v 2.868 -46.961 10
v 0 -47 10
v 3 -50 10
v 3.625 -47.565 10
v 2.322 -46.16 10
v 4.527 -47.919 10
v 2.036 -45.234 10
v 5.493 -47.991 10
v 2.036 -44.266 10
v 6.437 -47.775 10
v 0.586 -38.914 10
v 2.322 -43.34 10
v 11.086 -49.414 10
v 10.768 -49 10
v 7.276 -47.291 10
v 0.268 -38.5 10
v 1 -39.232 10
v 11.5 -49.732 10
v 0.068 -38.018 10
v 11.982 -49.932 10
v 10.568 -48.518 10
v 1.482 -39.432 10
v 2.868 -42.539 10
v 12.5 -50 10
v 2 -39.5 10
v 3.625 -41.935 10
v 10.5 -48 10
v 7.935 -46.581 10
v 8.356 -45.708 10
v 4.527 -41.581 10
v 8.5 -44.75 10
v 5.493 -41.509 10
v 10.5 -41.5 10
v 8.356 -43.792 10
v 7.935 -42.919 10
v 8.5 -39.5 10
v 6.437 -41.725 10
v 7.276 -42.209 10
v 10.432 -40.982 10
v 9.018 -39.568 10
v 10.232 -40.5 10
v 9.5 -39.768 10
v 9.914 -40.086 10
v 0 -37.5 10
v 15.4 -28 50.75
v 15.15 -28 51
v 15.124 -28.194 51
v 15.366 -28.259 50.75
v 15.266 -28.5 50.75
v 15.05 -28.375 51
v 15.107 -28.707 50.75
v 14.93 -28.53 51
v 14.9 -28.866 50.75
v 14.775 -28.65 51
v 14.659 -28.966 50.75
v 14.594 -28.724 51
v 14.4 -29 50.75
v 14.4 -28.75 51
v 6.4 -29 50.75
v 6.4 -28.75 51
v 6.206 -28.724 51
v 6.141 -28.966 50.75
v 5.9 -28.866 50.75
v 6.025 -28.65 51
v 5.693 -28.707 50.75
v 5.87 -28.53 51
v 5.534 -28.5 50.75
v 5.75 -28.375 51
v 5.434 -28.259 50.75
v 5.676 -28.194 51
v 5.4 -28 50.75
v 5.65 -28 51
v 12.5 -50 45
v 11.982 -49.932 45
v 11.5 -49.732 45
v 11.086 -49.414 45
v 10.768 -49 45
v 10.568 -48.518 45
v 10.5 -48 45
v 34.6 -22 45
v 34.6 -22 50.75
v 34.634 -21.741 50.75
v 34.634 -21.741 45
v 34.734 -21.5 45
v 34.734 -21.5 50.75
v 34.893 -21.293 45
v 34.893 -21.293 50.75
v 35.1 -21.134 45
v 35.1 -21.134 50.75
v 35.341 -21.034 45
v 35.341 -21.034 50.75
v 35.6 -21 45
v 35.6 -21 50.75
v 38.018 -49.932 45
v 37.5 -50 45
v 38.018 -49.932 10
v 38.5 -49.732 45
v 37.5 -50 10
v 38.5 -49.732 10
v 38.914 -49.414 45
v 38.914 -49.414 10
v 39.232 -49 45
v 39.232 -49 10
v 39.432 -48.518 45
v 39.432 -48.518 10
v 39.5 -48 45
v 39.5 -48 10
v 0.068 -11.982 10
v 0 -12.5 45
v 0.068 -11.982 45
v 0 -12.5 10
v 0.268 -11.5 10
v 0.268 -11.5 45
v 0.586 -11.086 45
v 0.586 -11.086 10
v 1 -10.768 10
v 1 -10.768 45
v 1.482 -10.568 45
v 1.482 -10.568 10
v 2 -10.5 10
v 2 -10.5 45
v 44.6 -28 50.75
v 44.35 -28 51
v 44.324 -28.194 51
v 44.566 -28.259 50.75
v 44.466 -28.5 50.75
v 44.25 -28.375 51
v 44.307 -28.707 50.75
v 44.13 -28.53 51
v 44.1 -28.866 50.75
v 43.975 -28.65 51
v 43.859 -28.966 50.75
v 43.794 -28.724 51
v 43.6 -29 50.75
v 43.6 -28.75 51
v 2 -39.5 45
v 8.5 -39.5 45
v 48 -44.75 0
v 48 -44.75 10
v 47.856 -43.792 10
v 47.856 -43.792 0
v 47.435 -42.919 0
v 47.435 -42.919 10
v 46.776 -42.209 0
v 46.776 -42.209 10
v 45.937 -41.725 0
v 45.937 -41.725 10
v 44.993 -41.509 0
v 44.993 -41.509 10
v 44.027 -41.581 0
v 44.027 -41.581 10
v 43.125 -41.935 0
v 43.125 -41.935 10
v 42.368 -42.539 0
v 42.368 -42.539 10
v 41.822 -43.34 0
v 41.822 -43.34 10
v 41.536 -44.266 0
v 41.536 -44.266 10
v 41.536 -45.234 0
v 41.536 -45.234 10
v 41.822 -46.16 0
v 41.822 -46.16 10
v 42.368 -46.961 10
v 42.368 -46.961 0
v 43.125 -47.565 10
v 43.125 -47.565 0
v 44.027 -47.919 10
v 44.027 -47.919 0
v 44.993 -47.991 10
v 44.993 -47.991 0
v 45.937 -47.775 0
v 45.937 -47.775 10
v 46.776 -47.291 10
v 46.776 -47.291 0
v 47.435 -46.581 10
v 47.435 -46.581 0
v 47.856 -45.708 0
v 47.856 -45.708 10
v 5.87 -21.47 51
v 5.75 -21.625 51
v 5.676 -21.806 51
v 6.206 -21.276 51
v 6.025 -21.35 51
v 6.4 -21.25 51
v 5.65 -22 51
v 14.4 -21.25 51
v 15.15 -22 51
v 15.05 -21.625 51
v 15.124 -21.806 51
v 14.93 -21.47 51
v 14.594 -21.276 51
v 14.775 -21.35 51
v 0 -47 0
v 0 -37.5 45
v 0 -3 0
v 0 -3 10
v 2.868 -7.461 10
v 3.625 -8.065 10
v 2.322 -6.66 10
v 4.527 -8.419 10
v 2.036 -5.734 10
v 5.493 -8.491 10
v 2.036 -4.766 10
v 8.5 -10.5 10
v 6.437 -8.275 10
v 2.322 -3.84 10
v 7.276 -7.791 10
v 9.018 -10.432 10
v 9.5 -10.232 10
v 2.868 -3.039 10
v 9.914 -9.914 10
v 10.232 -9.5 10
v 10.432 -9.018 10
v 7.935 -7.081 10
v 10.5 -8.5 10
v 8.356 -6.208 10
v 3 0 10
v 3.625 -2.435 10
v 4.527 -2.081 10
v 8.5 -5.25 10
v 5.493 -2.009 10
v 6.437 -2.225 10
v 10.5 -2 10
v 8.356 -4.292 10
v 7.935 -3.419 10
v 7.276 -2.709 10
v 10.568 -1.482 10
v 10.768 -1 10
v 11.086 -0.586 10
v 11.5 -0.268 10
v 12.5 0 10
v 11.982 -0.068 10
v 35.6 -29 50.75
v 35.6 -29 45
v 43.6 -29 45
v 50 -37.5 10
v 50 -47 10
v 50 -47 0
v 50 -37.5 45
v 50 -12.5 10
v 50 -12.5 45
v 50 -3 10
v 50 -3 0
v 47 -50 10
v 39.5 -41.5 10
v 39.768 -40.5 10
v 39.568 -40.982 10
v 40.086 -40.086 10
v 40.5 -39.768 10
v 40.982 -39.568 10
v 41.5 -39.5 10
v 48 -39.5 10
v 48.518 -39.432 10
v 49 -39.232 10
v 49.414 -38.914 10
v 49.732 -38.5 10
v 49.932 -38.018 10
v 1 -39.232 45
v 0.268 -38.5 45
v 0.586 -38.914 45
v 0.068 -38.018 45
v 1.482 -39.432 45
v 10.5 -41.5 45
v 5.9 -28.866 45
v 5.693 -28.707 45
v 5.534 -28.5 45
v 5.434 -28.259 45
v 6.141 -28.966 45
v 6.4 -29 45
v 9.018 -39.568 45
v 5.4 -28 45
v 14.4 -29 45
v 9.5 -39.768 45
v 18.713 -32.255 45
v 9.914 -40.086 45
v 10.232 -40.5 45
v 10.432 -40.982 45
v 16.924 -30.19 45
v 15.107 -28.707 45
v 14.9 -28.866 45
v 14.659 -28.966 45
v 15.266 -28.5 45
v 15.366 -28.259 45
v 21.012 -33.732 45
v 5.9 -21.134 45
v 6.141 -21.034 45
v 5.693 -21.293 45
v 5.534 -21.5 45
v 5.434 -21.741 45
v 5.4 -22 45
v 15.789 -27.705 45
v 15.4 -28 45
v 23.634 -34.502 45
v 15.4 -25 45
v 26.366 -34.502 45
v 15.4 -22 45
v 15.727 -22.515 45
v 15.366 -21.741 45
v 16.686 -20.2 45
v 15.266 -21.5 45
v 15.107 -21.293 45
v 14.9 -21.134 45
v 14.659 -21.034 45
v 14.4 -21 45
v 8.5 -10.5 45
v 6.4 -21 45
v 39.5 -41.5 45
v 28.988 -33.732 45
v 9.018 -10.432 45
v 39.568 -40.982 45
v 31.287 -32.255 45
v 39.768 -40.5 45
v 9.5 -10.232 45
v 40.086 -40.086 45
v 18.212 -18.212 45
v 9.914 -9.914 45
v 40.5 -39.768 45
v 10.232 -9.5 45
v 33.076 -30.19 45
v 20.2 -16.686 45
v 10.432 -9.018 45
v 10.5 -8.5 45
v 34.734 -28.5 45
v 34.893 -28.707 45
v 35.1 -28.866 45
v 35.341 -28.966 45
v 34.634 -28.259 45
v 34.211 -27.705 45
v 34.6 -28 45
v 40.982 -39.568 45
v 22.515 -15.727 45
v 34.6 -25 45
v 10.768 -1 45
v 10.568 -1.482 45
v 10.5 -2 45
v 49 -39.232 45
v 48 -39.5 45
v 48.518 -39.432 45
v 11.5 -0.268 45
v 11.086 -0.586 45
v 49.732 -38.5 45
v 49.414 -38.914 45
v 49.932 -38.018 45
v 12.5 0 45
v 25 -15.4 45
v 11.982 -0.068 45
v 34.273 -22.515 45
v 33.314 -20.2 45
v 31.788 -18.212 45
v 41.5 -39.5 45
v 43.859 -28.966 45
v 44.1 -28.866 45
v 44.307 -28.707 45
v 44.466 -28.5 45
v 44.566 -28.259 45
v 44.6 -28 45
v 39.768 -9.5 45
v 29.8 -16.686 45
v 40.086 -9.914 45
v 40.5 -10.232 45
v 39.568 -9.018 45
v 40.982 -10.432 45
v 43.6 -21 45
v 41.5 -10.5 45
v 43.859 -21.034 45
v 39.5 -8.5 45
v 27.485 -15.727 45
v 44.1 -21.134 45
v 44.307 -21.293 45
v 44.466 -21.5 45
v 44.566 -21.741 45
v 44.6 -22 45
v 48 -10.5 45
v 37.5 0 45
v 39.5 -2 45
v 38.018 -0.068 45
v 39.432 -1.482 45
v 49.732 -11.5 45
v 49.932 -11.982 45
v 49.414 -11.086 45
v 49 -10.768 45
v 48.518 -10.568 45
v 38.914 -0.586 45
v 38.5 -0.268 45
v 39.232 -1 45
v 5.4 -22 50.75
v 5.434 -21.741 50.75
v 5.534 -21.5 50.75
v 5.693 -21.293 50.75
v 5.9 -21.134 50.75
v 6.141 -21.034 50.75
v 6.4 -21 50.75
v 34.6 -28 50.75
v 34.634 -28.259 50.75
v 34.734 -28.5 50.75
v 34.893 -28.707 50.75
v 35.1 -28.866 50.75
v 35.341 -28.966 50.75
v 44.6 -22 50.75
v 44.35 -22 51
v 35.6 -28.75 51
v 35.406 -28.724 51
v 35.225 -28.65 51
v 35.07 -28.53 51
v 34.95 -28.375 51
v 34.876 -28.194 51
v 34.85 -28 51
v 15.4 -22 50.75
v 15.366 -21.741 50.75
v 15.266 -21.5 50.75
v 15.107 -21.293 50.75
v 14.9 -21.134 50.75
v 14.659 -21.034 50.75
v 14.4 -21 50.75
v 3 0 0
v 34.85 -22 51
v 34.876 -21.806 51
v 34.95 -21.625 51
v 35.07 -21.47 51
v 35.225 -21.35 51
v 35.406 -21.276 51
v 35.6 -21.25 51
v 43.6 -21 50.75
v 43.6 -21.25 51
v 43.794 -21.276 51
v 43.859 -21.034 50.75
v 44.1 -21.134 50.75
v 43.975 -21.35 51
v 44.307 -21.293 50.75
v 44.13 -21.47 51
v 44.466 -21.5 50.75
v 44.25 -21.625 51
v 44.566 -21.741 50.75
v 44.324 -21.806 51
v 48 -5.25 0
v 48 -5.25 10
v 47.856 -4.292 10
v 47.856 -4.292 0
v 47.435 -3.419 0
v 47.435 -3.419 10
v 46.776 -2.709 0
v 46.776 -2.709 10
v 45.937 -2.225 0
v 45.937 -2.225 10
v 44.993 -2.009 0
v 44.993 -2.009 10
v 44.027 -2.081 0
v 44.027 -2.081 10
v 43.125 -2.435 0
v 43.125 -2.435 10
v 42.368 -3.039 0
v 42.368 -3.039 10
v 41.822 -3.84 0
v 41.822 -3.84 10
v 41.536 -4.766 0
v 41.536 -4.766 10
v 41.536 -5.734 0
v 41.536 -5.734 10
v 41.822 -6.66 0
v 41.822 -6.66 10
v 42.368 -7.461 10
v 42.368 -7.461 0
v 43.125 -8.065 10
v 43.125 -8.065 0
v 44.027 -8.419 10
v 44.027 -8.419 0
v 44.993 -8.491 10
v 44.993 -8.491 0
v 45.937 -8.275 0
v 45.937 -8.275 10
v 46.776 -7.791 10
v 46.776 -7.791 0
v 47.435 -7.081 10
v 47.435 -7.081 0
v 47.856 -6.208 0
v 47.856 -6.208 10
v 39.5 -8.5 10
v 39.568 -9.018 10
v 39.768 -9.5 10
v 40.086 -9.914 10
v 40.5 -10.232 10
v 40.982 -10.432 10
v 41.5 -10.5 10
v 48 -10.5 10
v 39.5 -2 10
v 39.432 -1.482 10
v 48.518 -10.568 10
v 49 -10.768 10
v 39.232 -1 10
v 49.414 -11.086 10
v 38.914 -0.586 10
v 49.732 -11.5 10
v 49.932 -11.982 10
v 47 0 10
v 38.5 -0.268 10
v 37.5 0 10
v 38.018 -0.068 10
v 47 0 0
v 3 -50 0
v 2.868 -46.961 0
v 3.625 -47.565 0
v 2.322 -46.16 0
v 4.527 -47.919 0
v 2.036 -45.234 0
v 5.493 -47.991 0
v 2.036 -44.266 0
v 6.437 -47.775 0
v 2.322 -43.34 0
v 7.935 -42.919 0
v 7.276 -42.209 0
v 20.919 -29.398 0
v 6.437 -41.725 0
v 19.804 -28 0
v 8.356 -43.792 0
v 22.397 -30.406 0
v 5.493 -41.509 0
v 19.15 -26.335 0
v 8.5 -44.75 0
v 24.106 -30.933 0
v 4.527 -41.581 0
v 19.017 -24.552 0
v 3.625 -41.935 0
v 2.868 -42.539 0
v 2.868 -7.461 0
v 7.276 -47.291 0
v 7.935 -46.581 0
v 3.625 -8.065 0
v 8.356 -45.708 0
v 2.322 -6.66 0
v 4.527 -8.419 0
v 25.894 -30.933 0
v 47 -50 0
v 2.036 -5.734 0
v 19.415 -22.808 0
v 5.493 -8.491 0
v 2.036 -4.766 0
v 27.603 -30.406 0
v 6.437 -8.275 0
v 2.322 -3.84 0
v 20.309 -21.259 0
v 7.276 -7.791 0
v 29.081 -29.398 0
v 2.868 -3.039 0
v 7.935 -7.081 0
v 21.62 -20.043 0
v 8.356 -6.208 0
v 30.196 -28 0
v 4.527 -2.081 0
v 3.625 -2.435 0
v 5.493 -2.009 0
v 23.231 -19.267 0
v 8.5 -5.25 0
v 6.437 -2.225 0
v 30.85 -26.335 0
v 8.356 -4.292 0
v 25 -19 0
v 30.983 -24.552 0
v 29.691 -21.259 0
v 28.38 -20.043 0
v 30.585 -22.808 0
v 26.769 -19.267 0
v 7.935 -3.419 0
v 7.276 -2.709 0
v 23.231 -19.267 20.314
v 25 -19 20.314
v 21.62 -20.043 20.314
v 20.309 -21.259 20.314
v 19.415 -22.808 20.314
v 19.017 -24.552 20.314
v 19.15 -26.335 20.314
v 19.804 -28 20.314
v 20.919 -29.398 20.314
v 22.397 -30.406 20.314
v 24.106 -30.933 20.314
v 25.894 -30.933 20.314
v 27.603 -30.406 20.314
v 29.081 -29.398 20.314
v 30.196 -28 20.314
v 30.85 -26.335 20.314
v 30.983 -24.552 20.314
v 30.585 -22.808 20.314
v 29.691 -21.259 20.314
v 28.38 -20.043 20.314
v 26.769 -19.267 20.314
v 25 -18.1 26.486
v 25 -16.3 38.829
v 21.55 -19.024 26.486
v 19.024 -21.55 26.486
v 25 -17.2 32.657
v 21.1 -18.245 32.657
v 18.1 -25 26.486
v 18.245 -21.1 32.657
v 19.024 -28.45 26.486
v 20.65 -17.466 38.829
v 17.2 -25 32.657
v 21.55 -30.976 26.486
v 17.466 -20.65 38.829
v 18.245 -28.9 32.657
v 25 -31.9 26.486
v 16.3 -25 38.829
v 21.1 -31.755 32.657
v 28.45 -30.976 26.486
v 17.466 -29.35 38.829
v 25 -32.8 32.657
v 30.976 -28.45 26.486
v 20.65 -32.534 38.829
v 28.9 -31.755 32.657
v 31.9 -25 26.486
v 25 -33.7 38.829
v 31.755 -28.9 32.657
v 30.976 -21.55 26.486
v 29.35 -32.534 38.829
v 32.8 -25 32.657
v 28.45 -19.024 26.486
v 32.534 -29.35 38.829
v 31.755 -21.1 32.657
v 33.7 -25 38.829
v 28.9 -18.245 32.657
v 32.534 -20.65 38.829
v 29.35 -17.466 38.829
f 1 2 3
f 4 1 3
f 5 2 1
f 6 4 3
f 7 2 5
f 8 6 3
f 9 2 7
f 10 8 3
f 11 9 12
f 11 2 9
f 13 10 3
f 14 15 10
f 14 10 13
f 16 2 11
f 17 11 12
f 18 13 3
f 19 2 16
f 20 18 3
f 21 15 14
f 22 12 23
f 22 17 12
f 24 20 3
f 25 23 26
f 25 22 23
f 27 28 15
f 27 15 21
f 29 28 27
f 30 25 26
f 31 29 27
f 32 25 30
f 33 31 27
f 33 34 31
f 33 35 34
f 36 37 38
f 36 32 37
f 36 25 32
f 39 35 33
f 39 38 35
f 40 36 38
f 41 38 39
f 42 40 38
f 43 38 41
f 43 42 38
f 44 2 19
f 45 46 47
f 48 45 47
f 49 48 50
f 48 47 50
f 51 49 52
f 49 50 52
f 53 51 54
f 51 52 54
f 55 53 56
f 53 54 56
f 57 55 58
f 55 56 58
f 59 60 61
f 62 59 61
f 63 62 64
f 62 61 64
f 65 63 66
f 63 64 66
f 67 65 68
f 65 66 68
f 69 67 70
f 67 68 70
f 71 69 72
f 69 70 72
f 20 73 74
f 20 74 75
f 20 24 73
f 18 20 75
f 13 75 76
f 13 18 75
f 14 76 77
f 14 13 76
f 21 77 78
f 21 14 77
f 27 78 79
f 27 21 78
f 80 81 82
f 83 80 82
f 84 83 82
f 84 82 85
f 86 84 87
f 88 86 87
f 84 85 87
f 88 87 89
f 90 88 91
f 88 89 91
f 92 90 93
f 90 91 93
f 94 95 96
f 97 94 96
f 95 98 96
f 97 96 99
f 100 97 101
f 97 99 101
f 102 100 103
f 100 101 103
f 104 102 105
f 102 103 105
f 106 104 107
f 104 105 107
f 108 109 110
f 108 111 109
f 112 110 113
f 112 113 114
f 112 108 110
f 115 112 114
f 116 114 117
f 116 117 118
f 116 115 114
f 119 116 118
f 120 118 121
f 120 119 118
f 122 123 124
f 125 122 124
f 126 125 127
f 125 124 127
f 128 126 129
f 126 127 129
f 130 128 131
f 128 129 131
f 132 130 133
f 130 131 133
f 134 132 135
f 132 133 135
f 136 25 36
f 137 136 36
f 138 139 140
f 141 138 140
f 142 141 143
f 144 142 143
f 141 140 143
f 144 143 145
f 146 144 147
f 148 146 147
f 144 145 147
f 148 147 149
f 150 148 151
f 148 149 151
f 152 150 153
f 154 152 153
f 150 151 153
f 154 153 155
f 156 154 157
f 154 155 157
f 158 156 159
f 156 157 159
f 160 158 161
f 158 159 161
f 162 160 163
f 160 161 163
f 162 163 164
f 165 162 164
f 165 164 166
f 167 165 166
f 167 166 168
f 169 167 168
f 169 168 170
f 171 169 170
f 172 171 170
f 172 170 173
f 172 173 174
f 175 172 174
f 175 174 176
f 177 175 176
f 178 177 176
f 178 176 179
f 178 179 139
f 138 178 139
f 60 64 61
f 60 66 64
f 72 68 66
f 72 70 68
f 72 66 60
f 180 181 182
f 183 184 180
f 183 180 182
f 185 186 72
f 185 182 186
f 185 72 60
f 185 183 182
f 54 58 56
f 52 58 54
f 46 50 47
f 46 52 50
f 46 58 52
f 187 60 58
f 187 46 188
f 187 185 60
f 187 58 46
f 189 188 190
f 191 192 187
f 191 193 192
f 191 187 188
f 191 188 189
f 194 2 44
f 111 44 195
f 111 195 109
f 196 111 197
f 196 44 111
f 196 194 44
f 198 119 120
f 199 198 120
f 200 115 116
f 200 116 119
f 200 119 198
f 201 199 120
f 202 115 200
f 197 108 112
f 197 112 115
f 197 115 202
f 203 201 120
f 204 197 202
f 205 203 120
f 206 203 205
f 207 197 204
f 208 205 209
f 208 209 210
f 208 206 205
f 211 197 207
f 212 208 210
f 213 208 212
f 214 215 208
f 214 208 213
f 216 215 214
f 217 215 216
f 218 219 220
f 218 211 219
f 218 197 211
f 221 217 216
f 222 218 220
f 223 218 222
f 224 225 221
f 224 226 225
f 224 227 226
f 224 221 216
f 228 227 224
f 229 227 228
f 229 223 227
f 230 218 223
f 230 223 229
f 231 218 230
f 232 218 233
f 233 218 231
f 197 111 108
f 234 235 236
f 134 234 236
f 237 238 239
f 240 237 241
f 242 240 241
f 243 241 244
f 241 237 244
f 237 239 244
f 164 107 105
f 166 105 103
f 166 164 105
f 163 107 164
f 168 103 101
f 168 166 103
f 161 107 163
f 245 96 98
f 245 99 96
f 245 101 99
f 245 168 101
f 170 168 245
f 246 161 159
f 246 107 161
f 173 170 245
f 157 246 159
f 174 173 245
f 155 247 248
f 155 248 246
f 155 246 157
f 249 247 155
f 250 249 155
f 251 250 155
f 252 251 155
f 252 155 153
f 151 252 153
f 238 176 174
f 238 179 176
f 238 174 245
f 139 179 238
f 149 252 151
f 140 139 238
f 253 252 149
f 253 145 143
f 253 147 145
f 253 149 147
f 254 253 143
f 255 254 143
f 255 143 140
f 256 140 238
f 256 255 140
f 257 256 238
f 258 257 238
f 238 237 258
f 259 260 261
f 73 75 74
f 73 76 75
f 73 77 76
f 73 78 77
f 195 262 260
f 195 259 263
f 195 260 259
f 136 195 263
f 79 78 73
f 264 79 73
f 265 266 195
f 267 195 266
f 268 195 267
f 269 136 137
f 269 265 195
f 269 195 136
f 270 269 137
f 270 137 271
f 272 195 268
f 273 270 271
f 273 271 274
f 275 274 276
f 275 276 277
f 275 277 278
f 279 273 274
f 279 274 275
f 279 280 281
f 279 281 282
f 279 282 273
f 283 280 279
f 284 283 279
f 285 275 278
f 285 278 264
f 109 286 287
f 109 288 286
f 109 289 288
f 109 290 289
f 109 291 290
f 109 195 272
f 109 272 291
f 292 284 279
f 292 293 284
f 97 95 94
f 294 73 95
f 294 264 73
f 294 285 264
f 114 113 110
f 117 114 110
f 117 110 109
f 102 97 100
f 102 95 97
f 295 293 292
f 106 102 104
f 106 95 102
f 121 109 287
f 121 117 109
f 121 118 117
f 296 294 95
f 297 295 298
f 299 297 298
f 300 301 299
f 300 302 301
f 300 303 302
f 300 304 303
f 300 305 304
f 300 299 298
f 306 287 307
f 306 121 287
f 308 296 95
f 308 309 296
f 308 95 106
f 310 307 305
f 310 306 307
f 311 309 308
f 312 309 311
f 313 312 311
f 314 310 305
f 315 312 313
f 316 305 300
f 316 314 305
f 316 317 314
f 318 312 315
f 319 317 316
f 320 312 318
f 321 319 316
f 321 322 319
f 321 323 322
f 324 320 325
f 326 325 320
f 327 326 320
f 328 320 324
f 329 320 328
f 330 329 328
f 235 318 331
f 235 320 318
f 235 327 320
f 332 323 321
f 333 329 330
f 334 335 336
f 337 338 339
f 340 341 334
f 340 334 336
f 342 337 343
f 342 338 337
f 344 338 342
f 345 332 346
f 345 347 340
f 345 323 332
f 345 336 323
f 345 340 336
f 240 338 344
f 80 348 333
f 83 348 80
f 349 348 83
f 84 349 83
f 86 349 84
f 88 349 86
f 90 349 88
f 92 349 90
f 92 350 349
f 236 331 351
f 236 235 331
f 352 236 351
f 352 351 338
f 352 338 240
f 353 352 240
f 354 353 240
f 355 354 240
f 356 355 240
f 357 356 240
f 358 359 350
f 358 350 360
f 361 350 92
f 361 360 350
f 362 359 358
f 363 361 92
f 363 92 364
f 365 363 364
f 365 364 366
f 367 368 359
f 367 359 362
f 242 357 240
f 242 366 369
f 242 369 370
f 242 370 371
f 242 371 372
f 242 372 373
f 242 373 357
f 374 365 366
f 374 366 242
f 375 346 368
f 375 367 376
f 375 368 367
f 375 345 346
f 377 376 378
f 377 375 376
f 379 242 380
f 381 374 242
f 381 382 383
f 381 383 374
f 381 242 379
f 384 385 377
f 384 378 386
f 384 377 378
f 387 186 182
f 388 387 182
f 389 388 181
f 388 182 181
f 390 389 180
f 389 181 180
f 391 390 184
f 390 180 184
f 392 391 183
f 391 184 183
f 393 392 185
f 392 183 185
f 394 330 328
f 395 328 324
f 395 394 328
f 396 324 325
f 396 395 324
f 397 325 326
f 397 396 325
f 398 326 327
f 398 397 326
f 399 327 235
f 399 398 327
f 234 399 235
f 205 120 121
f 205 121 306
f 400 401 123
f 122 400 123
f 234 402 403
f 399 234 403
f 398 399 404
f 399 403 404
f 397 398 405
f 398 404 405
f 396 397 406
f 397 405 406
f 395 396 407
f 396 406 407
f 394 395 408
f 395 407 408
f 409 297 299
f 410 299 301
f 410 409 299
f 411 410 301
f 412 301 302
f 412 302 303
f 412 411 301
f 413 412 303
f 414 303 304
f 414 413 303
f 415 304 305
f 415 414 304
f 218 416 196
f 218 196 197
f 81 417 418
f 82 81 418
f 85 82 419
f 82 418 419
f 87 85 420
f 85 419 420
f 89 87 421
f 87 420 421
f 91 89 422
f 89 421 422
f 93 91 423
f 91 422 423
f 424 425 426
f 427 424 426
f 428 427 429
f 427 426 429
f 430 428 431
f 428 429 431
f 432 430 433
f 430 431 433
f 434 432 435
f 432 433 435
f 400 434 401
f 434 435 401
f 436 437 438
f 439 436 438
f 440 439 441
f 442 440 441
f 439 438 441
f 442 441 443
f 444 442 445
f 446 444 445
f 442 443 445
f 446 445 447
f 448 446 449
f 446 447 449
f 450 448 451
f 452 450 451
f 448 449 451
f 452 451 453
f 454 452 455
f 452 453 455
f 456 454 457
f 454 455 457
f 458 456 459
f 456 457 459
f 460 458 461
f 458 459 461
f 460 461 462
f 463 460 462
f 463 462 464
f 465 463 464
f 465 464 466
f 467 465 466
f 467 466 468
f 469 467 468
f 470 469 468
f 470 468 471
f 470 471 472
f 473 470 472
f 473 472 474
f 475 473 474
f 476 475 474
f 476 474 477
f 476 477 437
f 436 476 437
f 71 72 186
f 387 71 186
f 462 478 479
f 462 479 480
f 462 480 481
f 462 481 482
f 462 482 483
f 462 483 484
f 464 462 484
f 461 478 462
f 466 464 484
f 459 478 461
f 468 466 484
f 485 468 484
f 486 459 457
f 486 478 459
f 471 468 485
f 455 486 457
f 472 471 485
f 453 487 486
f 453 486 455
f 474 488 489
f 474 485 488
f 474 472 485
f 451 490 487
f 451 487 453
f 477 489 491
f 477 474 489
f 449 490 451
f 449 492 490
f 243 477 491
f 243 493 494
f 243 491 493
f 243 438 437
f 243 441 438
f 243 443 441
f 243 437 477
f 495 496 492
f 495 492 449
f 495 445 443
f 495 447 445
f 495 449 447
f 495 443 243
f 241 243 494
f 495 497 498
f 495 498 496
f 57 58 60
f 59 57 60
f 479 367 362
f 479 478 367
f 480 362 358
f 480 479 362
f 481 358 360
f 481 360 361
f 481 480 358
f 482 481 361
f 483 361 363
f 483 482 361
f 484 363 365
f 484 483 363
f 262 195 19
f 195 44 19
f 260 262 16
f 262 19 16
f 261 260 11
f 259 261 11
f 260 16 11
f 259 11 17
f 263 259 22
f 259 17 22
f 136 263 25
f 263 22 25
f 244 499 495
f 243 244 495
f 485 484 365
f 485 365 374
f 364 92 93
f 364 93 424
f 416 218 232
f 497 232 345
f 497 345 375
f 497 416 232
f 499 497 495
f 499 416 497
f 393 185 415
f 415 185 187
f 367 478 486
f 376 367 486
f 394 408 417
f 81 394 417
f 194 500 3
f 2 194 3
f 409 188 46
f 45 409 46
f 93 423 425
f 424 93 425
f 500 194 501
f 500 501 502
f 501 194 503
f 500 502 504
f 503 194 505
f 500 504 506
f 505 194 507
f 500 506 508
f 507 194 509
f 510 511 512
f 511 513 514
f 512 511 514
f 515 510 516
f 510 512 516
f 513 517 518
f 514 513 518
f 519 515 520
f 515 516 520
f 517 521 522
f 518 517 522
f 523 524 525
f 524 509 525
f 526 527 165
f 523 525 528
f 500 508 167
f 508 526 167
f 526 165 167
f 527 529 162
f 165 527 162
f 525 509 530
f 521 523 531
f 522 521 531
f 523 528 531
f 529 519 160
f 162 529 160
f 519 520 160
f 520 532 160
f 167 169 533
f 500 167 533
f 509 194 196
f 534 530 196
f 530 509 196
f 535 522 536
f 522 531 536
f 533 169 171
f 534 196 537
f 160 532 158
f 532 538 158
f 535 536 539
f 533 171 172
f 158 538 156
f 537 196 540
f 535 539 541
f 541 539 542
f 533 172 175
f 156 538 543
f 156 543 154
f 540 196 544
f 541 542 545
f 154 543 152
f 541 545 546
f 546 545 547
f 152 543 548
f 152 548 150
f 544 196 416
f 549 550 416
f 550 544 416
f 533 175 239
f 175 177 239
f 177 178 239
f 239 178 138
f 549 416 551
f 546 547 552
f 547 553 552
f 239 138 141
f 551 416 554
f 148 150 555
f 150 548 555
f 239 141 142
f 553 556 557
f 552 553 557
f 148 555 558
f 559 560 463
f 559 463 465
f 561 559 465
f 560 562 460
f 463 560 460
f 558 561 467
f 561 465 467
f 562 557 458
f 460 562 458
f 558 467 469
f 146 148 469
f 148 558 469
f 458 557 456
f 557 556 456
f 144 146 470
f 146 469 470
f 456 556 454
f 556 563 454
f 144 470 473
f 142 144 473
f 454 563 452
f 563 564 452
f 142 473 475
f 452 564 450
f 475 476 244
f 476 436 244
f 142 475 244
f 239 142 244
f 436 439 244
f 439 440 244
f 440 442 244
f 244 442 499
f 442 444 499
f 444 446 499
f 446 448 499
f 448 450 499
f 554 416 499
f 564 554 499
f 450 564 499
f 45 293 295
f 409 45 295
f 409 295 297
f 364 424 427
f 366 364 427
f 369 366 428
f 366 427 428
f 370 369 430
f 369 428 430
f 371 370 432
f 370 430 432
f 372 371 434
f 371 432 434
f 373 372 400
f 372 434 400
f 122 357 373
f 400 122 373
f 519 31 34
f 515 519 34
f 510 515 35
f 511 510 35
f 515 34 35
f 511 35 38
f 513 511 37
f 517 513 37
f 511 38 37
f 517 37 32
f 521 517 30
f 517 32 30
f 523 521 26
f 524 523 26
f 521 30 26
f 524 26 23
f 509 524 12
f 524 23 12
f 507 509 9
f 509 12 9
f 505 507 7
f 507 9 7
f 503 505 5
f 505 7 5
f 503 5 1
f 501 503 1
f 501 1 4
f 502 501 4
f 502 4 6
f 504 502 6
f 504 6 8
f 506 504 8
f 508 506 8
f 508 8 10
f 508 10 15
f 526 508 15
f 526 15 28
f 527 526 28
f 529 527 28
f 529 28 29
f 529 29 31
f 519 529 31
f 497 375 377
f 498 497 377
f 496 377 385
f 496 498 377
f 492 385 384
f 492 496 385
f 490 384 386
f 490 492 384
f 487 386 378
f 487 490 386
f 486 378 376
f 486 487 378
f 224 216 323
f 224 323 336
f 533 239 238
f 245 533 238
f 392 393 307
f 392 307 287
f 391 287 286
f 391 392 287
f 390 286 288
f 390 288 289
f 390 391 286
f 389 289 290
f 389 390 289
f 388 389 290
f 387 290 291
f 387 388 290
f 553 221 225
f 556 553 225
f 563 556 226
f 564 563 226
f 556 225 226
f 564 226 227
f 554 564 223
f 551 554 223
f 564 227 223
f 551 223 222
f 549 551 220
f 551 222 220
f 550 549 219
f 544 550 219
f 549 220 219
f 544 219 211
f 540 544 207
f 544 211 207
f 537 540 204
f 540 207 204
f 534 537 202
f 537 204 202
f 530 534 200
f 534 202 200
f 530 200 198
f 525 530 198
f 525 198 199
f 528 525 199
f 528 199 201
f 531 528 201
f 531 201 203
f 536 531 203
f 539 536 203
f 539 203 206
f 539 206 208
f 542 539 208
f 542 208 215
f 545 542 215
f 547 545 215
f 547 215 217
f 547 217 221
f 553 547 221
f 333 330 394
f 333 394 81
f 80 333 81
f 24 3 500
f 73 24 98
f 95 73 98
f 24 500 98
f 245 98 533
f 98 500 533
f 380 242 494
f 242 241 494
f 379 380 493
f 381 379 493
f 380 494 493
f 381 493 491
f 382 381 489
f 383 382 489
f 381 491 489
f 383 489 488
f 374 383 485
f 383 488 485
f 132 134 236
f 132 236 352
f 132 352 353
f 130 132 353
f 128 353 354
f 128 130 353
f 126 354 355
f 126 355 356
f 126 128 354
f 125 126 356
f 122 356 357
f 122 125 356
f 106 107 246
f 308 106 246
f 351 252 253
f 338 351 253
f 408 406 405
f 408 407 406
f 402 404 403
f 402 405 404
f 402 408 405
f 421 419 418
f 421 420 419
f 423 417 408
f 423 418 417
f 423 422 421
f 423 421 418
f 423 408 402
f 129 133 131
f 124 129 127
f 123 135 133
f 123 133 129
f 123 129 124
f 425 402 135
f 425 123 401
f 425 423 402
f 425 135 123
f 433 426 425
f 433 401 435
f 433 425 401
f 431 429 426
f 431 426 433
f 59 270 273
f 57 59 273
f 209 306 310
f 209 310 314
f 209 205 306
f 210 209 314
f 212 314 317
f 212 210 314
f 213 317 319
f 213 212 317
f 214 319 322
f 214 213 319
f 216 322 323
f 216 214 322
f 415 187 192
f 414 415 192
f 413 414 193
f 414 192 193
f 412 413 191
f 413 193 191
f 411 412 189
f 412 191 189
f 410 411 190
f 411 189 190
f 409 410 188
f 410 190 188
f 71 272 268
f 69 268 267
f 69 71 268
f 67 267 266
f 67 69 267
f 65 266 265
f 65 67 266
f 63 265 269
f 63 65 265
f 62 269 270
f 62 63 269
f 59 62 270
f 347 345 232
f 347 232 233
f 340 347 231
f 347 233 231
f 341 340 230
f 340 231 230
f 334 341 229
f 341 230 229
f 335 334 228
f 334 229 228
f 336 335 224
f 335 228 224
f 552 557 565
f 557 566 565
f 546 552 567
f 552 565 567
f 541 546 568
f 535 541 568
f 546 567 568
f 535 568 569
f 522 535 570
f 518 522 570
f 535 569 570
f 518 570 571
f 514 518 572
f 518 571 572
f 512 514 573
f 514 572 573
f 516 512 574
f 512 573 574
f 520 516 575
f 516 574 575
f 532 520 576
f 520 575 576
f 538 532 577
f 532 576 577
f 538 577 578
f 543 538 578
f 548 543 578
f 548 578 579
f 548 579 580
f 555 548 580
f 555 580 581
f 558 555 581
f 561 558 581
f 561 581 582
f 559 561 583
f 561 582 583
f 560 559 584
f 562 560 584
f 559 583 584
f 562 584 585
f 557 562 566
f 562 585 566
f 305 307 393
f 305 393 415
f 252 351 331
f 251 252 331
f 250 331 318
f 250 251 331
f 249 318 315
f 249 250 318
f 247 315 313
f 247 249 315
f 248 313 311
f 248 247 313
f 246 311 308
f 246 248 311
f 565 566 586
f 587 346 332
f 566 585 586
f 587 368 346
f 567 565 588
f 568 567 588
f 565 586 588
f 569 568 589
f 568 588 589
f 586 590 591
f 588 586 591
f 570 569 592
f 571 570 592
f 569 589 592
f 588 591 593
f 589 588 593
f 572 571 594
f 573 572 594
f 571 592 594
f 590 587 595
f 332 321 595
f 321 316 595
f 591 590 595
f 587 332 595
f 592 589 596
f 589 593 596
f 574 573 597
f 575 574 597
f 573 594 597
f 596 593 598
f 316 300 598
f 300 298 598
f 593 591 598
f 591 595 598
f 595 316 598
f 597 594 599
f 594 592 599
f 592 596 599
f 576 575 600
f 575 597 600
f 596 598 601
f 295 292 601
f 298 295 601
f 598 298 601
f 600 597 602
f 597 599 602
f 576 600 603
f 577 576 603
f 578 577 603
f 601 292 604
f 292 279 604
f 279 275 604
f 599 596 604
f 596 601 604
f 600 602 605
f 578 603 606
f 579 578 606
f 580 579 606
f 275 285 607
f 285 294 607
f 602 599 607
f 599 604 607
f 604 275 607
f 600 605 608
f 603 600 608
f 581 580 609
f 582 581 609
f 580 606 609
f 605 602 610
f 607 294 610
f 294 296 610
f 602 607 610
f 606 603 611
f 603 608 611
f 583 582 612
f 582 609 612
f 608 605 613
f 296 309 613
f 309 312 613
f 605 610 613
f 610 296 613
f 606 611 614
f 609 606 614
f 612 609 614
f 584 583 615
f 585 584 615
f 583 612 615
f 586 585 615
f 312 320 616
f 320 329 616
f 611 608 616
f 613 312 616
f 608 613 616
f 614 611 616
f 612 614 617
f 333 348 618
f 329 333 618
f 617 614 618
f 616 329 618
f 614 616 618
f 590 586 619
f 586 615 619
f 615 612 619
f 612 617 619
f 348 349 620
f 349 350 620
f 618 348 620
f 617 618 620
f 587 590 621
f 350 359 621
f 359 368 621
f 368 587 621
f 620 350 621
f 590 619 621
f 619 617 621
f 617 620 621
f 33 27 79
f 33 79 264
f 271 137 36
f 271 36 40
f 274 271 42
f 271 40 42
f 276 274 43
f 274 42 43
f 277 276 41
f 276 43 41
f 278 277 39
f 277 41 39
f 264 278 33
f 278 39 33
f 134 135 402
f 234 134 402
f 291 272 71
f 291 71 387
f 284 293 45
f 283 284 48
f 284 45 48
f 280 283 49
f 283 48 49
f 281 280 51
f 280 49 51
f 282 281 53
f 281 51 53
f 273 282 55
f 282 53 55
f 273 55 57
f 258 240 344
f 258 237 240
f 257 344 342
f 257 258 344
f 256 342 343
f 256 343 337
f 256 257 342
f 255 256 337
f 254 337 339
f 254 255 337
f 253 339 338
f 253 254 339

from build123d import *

# Parameters (mm, degrees)
SKETCH_1_W          = 50
SKETCH_1_H          = 50
EXTRUDE_1_DEPTH     = 45
SKETCH_4_W          = 10.5
SKETCH_4_H          = 10.5
CUT_EXTRUDE_1_DEPTH = 35
FILLET_1_R          = 2
CHAMFER_1_SIZE      = 3
SKETCH_5_R          = 3.25
CUT_EXTRUDE_2_DEPTH = 11
SKETCH_7_W          = 10
SKETCH_7_H          = 8
EXTRUDE_4_DEPTH     = 6
FILLET_2_R          = 1
CHAMFER_2_SIZE      = 0.25


with BuildPart() as part:
    # 草图1 → 凸台-拉伸1 (new body)
    with BuildSketch(Plane.XY):
        with Locations((25, -25)):
            Rectangle(SKETCH_1_W, SKETCH_1_H)
    extrude(amount=EXTRUDE_1_DEPTH)

    # 草图4 → 切除-拉伸1 (cut)
    with BuildSketch(Plane.XY.offset(45)):
        with Locations((5.25, -5.25)):
            Rectangle(SKETCH_4_W, SKETCH_4_H)
        with Locations((44.75, -5.25)):
            Rectangle(SKETCH_4_W, SKETCH_4_H)
        with Locations((44.75, -44.75)):
            Rectangle(SKETCH_4_W, SKETCH_4_H)
        with Locations((5.25, -44.75)):
            Rectangle(SKETCH_4_W, SKETCH_4_H)
    extrude(amount=-CUT_EXTRUDE_1_DEPTH, mode=Mode.SUBTRACT)

    # 圆角1
    fillet_1_edges = [part.edges().sort_by_distance(p)[0] for p in [
        (0, -39.5, 27.5),
        (10.5, -39.5, 27.5),
        (10.5, -50, 27.5),
        (39.5, -50, 27.5),
        (39.5, -39.5, 27.5),
        (50, -39.5, 27.5),
        (50, -10.5, 27.5),
        (39.5, -10.5, 27.5),
        (39.5, 0, 27.5),
        (0, -10.5, 27.5),
        (10.5, 0, 27.5),
        (10.5, -10.5, 27.5),
    ]]
    fillet(fillet_1_edges, radius=FILLET_1_R)

    # 倒角1
    chamfer_1_edges = [part.edges().sort_by_distance(p)[0] for p in [
        (0, 0, 5),
        (50, 0, 5),
        (50, -50, 5),
        (0, -50, 5),
    ]]
    chamfer(chamfer_1_edges, length=CHAMFER_1_SIZE)

    # 草图5 → 切除-拉伸2 (cut, through all)
    with BuildSketch(Plane.XY.offset(10)):
        with Locations((5.25, -5.25)):
            Circle(SKETCH_5_R)
        with Locations((44.75, -5.25)):
            Circle(SKETCH_5_R)
        with Locations((44.75, -44.75)):
            Circle(SKETCH_5_R)
        with Locations((5.25, -44.75)):
            Circle(SKETCH_5_R)
    extrude(amount=-CUT_EXTRUDE_2_DEPTH, mode=Mode.SUBTRACT)

    # 草图6 → 切除-旋转1 (revolve, cut)
    with BuildSketch(Plane(origin=(25, 0, 0), x_dir=(0, 0, -1), z_dir=(1, 0, 0))):
        Polygon((-45, -15.4), (-45, -25), (0, -25), (0, -19), (-20.314285805, -19), align=None)
    revolve(axis=Axis((25, -25, 0), (0, 0, 1)), mode=Mode.SUBTRACT)

    # 草图7 → 凸台-拉伸4 (add)
    with BuildSketch(Plane.XY.offset(45)):
        with Locations((39.6, -25)):
            Rectangle(SKETCH_7_W, SKETCH_7_H)
        with Locations((10.4, -25)):
            Rectangle(SKETCH_7_W, SKETCH_7_H)
    extrude(amount=EXTRUDE_4_DEPTH)

    # 圆角2
    fillet_2_edges = [part.edges().sort_by_distance(p)[0] for p in [
        (34.6, -21, 48),
        (34.6, -29, 48),
        (44.6, -29, 48),
        (44.6, -21, 48),
        (15.4, -29, 48),
        (15.4, -21, 48),
        (5.4, -21, 48),
        (5.4, -29, 48),
    ]]
    fillet(fillet_2_edges, radius=FILLET_2_R)

    # 倒角2
    chamfer_2_edges = [part.edges().sort_by_distance(p)[0] for p in [
        (5.4, -25, 51),
        (10.4, -21, 51),
        (15.4, -25, 51),
        (10.4, -29, 51),
        (15.107106781, -21.292893219, 51),
        (15.107106781, -28.707106781, 51),
        (5.692893219, -28.707106781, 51),
        (5.692893219, -21.292893219, 51),
        (34.6, -25, 51),
        (39.6, -21, 51),
        (39.6, -29, 51),
        (44.6, -25, 51),
        (44.307106781, -28.707106781, 51),
        (34.892893219, -28.707106781, 51),
        (44.307106781, -21.292893219, 51),
        (34.892893219, -21.292893219, 51),
    ]]
    chamfer(chamfer_2_edges, length=CHAMFER_2_SIZE)


solid = part.part
